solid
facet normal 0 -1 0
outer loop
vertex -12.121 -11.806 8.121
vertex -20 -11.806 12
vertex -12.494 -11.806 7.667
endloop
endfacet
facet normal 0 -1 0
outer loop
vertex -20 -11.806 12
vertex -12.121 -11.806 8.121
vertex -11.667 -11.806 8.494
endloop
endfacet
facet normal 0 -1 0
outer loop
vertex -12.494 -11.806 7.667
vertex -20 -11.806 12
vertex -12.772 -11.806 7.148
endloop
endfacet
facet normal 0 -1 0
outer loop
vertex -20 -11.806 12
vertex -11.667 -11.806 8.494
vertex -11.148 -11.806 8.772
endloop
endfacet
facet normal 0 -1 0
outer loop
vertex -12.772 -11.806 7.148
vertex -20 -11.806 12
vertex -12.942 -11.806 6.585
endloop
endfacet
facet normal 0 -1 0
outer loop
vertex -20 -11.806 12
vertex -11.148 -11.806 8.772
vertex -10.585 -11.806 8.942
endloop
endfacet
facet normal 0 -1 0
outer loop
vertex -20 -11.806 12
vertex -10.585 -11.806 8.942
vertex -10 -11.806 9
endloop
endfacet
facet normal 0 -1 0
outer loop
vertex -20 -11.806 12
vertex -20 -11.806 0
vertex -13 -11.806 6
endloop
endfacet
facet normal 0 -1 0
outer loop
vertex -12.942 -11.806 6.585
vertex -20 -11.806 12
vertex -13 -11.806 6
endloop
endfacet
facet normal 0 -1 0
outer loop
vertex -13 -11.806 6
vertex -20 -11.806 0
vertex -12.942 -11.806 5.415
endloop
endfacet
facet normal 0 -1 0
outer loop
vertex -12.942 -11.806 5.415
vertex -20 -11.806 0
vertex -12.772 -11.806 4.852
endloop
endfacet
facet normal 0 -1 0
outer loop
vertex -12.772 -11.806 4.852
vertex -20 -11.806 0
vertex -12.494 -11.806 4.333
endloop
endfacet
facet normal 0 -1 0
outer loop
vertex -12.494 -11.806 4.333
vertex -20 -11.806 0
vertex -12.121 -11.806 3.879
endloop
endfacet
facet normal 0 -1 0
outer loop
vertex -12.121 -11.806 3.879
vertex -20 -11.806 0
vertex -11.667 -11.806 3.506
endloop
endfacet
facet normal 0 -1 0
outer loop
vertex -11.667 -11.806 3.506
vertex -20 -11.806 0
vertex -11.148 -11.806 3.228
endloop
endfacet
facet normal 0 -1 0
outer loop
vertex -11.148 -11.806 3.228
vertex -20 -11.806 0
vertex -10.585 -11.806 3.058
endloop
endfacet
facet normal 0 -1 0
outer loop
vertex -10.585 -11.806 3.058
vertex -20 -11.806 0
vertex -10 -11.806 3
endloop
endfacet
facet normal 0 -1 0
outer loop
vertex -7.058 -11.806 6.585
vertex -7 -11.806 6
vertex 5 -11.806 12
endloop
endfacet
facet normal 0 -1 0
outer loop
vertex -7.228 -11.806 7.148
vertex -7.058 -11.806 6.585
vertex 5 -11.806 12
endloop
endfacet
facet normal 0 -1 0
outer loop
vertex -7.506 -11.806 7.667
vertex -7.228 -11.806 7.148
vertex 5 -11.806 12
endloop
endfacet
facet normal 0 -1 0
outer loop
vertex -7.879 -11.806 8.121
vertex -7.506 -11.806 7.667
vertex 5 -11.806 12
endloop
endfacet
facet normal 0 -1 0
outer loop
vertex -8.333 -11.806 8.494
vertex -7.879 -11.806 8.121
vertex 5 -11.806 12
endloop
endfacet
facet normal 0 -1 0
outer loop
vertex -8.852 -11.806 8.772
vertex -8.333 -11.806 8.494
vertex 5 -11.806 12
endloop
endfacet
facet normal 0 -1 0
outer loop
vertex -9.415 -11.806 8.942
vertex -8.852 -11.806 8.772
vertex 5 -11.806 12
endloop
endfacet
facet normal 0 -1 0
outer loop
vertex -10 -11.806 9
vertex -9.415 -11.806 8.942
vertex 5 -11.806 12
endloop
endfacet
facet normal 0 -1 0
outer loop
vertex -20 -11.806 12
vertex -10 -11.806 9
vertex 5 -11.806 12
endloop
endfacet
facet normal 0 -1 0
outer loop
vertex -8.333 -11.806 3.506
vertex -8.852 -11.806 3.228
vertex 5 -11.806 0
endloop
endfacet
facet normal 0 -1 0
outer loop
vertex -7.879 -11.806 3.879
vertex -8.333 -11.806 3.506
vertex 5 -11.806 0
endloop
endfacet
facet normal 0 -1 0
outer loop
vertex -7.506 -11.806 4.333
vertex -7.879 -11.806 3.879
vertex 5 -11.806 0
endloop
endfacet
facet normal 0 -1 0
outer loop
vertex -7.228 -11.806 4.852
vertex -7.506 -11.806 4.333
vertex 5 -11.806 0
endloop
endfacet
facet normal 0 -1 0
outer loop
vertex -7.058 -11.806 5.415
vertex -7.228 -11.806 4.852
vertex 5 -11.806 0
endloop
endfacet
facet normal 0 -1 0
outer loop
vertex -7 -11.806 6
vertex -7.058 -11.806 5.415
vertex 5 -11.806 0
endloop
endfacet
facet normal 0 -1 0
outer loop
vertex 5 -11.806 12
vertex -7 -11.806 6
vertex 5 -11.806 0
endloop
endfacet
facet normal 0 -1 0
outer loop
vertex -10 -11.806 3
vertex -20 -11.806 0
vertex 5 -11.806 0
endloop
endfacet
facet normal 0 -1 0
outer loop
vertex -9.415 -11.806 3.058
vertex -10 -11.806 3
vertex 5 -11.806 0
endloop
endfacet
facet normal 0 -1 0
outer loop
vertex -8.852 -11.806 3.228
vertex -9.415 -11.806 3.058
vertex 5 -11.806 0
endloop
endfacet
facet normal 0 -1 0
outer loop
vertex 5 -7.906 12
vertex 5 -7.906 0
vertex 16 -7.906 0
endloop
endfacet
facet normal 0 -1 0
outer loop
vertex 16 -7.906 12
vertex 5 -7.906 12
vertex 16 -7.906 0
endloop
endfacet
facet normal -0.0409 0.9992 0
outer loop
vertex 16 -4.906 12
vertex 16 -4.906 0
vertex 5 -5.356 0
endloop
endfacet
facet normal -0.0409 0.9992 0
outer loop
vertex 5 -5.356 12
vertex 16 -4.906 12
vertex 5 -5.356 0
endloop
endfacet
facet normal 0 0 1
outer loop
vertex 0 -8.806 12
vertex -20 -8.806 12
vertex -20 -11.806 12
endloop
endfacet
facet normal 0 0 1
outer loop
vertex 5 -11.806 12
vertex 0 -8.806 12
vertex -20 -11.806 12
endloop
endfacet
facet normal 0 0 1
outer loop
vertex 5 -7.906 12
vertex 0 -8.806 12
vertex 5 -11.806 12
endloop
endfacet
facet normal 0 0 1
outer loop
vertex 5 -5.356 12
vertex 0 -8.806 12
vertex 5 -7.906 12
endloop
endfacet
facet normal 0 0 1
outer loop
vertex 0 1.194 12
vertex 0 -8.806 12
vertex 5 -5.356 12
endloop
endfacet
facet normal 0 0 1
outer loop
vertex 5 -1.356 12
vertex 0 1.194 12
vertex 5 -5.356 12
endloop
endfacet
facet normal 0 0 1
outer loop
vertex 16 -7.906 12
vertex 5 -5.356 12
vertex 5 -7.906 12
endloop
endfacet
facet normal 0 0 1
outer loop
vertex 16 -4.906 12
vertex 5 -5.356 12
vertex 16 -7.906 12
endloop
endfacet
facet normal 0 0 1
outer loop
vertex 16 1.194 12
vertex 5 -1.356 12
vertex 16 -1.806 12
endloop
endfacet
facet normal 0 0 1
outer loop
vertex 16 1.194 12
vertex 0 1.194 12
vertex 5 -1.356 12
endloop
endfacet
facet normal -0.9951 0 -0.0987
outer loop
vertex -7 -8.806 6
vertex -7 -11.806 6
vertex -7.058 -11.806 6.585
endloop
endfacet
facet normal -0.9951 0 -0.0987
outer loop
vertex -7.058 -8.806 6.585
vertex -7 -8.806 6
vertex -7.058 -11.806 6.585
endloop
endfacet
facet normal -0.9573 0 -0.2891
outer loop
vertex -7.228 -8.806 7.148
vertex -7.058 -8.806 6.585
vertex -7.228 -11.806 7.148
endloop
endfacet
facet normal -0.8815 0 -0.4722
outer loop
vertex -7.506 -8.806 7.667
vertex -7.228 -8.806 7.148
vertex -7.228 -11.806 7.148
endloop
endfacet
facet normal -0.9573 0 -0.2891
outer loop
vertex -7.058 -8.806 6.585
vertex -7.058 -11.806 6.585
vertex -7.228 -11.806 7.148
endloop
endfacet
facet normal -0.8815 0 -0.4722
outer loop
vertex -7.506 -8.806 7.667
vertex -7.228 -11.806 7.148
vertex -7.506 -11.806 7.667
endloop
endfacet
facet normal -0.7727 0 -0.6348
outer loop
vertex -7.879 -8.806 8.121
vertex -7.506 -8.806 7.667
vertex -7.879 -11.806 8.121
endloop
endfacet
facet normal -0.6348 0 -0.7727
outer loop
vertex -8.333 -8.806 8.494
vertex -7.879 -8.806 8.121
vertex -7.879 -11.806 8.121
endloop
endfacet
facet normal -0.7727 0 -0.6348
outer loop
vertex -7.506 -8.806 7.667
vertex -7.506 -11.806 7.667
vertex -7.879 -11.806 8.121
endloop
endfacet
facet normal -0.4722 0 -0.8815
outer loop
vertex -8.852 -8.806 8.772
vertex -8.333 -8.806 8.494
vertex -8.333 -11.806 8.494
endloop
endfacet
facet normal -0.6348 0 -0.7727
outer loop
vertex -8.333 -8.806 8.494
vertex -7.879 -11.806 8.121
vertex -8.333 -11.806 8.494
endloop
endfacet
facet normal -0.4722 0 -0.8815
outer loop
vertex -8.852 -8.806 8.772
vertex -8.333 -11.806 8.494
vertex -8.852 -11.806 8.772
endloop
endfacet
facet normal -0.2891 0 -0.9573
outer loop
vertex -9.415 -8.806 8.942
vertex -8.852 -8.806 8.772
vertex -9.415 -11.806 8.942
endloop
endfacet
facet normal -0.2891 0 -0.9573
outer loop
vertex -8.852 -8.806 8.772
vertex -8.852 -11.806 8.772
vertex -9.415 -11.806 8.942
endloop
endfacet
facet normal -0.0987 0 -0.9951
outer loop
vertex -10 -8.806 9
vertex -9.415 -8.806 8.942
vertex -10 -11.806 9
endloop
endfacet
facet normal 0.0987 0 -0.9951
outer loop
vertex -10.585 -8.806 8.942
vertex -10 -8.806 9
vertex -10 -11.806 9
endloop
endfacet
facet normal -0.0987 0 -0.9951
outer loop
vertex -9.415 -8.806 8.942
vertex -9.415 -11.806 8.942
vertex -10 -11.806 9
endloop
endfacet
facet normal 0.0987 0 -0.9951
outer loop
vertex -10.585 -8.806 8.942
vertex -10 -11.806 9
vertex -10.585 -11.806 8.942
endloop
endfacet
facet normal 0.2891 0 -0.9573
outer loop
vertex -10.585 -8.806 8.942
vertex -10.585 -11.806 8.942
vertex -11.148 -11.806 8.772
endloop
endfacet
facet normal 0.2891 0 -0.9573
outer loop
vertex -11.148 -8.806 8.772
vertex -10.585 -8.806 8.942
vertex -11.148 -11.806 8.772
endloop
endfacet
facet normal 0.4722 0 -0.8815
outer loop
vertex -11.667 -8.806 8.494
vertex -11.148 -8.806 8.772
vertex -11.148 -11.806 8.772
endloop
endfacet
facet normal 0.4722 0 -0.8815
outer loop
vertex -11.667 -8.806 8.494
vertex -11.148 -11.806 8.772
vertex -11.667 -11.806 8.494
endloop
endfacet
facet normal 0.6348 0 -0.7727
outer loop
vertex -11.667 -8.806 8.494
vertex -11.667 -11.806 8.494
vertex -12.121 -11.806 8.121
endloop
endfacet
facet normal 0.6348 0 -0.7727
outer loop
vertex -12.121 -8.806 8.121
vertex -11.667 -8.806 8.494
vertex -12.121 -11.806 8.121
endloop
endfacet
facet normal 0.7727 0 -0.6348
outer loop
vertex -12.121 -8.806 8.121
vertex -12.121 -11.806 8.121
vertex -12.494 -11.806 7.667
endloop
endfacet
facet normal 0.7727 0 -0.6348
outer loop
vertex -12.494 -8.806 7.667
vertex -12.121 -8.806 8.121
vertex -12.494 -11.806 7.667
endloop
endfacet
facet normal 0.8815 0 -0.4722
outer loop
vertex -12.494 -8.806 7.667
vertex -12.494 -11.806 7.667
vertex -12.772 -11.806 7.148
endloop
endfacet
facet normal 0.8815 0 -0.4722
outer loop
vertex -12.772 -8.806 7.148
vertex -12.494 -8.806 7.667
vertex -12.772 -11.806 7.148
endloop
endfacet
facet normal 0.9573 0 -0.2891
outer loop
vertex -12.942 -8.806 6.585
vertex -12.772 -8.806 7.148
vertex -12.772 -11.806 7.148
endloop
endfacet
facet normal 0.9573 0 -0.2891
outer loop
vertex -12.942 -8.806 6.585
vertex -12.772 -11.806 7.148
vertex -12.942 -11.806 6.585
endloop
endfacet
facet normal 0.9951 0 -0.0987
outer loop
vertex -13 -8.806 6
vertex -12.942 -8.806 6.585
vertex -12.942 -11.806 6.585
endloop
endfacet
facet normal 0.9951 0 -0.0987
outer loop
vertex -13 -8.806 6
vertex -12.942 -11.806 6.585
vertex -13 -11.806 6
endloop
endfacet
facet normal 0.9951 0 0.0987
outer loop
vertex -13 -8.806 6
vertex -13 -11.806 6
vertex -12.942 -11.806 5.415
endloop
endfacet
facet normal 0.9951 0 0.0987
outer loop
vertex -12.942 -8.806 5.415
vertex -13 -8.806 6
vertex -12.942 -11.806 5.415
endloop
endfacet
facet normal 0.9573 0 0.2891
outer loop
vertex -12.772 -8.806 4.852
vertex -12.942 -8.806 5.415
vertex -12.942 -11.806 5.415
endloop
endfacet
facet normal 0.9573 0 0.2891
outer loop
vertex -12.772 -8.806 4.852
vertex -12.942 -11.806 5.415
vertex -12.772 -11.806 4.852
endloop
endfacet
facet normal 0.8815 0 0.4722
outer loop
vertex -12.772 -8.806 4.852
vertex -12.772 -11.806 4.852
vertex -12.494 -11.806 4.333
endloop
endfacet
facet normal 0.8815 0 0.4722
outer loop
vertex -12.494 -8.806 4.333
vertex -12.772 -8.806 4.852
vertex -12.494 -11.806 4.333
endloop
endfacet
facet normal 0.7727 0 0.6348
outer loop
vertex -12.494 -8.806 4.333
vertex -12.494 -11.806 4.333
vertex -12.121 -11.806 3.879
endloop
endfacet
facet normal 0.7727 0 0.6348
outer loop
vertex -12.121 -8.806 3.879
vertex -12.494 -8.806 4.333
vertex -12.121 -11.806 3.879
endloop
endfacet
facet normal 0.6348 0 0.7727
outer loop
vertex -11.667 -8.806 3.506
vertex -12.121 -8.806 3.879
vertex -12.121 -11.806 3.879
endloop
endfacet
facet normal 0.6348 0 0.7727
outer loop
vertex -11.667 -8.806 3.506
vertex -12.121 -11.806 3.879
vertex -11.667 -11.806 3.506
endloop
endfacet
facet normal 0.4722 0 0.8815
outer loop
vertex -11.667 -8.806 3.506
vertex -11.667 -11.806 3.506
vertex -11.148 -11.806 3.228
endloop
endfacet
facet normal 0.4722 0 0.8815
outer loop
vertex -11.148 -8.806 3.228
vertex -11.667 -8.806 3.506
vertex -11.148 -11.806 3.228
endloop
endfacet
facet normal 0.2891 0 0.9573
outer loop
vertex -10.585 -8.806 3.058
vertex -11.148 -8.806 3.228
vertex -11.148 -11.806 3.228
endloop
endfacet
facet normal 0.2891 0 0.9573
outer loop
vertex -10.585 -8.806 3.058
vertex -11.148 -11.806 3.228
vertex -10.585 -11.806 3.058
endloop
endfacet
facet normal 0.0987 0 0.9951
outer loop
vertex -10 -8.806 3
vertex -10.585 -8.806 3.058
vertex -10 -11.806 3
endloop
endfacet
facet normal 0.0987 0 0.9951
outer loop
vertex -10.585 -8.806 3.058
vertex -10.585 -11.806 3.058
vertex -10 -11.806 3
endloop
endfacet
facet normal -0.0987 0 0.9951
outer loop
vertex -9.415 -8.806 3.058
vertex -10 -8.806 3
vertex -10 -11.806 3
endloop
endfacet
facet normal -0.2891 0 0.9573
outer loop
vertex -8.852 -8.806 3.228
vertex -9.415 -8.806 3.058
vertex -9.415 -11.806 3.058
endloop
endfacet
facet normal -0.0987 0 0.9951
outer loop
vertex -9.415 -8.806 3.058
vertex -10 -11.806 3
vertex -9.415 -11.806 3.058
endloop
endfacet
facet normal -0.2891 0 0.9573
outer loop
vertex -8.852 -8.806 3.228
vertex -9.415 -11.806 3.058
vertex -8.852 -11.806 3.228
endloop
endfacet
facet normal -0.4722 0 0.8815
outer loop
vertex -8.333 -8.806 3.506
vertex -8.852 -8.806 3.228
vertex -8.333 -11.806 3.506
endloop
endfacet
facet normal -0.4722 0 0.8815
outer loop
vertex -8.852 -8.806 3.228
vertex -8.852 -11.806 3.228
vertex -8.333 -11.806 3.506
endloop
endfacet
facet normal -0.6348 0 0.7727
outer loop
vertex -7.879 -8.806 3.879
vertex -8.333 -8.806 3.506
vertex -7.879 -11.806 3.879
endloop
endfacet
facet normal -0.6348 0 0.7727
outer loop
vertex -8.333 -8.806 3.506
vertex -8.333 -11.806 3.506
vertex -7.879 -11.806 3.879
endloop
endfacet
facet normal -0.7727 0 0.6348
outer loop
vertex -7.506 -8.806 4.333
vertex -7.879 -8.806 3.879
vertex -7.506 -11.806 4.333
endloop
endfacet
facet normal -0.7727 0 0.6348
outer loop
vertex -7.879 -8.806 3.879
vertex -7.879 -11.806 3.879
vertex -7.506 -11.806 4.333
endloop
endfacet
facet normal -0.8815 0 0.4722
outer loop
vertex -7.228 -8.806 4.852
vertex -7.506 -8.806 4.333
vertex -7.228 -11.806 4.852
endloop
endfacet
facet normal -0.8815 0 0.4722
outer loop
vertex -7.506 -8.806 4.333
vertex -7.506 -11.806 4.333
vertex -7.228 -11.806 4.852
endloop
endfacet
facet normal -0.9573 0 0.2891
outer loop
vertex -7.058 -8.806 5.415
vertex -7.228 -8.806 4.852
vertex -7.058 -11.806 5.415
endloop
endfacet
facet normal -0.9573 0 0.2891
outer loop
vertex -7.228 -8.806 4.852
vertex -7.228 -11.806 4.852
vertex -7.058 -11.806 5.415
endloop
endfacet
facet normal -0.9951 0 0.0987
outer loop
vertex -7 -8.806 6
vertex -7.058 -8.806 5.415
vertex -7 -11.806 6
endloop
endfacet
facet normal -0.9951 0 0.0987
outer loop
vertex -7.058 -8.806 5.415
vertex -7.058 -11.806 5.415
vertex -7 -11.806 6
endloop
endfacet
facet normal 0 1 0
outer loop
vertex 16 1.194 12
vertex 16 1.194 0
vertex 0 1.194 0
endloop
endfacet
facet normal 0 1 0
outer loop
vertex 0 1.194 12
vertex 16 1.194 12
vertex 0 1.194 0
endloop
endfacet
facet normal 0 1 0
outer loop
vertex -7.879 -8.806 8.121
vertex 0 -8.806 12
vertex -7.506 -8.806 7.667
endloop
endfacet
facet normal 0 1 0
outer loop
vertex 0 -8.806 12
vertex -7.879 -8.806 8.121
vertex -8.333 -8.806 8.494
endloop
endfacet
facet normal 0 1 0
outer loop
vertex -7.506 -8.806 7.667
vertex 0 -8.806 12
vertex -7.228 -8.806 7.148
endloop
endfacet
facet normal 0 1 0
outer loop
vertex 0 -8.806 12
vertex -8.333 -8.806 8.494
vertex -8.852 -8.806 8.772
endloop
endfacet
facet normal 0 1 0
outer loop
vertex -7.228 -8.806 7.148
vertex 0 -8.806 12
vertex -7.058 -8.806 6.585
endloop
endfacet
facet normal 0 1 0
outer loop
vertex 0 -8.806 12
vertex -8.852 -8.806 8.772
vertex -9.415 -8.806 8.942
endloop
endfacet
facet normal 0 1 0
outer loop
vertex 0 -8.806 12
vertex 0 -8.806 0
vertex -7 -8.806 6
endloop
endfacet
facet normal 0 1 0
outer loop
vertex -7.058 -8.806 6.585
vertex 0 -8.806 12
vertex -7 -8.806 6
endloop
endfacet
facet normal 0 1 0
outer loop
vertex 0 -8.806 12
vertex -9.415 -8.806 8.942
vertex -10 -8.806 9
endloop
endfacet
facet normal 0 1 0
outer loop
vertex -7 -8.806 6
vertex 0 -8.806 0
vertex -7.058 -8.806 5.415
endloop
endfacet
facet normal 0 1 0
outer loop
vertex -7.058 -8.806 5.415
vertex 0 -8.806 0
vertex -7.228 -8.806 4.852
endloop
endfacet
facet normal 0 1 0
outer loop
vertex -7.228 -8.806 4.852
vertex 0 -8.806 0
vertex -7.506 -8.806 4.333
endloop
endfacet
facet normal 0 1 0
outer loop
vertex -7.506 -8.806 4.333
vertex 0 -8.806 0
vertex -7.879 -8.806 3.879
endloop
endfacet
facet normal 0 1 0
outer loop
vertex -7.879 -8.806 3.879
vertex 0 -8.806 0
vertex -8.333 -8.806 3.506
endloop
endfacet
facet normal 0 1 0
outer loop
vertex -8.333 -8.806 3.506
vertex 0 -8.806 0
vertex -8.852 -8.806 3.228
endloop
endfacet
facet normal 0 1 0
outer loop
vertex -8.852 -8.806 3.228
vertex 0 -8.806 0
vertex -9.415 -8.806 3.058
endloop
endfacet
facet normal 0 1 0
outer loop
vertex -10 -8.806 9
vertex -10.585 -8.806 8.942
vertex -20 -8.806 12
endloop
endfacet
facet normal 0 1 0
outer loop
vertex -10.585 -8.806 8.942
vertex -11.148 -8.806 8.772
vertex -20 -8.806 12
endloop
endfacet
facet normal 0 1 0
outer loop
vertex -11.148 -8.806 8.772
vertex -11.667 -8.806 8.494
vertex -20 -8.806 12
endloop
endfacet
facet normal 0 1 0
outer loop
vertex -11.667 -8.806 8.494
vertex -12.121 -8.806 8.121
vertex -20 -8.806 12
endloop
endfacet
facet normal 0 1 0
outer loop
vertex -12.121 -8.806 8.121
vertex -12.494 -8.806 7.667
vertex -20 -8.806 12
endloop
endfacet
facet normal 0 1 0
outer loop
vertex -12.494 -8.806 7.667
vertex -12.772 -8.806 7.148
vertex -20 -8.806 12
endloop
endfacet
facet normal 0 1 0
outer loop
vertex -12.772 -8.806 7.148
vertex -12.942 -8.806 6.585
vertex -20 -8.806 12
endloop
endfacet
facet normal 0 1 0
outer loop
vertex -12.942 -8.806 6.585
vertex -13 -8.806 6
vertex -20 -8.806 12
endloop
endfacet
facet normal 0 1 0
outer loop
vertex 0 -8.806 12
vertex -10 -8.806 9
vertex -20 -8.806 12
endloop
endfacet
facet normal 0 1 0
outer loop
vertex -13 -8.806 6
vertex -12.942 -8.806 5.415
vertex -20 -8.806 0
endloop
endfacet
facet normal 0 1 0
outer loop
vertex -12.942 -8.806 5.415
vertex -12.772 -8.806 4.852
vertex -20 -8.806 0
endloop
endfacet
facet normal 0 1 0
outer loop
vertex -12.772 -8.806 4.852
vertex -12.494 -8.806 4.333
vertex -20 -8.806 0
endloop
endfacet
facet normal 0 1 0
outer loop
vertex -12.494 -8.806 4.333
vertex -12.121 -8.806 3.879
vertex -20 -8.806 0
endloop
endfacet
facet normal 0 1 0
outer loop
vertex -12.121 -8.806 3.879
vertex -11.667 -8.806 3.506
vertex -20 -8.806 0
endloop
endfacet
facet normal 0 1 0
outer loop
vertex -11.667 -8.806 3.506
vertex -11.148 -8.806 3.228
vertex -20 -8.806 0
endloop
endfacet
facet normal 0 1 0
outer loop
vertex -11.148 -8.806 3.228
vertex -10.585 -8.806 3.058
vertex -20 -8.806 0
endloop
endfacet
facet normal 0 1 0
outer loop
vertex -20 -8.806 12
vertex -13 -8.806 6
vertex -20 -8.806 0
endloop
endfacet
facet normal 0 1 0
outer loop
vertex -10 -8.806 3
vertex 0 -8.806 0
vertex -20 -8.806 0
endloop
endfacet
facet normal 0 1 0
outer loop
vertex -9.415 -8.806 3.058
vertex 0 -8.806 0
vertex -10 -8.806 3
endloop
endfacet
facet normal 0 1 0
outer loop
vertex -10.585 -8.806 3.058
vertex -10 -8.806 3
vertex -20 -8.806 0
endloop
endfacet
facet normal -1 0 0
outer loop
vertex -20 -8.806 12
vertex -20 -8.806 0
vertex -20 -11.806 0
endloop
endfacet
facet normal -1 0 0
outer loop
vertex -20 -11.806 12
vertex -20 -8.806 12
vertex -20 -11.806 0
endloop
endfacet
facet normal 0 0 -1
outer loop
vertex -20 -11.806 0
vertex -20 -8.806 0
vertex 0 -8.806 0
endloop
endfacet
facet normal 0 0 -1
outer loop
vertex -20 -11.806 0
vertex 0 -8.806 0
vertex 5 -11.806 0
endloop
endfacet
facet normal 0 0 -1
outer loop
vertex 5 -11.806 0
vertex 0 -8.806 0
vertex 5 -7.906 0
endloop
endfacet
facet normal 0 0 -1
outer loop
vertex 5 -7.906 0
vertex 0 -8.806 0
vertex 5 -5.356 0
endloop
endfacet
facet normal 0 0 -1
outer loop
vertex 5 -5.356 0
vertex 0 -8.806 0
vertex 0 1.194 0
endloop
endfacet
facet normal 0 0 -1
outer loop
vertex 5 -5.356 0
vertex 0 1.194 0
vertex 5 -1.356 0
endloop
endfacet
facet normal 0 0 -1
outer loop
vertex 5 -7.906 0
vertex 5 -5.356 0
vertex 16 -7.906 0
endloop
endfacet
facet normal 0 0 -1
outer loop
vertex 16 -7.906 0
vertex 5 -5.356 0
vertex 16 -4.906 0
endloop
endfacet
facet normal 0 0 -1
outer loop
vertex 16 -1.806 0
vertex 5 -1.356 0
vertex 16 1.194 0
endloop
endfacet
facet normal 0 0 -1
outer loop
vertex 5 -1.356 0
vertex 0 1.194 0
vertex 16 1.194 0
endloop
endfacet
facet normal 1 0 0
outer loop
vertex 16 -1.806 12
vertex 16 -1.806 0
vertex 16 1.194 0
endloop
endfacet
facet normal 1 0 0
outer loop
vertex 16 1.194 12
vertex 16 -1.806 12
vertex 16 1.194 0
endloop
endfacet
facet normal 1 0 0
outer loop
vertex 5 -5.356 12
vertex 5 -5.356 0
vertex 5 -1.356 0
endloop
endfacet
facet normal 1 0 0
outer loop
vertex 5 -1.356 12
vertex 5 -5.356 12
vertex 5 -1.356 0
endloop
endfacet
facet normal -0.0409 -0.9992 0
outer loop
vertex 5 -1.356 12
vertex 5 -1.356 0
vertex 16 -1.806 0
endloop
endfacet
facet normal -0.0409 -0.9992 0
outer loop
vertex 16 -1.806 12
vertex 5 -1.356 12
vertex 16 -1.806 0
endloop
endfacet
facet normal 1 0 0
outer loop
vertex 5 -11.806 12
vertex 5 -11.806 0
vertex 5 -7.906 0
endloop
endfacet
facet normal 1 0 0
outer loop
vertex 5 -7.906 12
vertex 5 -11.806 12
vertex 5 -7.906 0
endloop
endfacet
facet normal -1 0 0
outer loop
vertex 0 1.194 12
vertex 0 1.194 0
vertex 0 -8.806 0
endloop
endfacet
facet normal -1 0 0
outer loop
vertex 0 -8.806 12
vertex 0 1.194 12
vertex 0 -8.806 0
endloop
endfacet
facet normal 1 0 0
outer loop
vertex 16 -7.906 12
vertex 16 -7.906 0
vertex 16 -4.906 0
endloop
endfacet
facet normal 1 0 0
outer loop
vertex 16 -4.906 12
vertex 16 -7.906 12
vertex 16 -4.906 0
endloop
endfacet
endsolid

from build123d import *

# Parameters (mm, degrees)
PAD_DEPTH   = 12
SKETCH001_R = 3
HOLE_DEPTH  = 25


with BuildPart() as part:
    # Sketch → Pad (new body)
    with BuildSketch(Plane.XY):
        Polygon((-20, -11.805553), (5, -11.805553), (5, -7.905553), (16, -7.905553), (16, -4.905553), (5, -5.355553), (5, -1.355553), (16, -1.805553), (16, 1.194447), (5, 1.194447), (0, 1.194447), (0, -8.805553), (-20, -8.805553), align=None)
    extrude(amount=PAD_DEPTH)

    # Sketch001 (on Face5 of Pad) → Hole (cut)
    with BuildSketch(Plane.XZ.offset(11.805553)):
        with Locations((-10, 6)):
            Circle(SKETCH001_R)
    extrude(amount=-HOLE_DEPTH, mode=Mode.SUBTRACT)


solid = part.part
